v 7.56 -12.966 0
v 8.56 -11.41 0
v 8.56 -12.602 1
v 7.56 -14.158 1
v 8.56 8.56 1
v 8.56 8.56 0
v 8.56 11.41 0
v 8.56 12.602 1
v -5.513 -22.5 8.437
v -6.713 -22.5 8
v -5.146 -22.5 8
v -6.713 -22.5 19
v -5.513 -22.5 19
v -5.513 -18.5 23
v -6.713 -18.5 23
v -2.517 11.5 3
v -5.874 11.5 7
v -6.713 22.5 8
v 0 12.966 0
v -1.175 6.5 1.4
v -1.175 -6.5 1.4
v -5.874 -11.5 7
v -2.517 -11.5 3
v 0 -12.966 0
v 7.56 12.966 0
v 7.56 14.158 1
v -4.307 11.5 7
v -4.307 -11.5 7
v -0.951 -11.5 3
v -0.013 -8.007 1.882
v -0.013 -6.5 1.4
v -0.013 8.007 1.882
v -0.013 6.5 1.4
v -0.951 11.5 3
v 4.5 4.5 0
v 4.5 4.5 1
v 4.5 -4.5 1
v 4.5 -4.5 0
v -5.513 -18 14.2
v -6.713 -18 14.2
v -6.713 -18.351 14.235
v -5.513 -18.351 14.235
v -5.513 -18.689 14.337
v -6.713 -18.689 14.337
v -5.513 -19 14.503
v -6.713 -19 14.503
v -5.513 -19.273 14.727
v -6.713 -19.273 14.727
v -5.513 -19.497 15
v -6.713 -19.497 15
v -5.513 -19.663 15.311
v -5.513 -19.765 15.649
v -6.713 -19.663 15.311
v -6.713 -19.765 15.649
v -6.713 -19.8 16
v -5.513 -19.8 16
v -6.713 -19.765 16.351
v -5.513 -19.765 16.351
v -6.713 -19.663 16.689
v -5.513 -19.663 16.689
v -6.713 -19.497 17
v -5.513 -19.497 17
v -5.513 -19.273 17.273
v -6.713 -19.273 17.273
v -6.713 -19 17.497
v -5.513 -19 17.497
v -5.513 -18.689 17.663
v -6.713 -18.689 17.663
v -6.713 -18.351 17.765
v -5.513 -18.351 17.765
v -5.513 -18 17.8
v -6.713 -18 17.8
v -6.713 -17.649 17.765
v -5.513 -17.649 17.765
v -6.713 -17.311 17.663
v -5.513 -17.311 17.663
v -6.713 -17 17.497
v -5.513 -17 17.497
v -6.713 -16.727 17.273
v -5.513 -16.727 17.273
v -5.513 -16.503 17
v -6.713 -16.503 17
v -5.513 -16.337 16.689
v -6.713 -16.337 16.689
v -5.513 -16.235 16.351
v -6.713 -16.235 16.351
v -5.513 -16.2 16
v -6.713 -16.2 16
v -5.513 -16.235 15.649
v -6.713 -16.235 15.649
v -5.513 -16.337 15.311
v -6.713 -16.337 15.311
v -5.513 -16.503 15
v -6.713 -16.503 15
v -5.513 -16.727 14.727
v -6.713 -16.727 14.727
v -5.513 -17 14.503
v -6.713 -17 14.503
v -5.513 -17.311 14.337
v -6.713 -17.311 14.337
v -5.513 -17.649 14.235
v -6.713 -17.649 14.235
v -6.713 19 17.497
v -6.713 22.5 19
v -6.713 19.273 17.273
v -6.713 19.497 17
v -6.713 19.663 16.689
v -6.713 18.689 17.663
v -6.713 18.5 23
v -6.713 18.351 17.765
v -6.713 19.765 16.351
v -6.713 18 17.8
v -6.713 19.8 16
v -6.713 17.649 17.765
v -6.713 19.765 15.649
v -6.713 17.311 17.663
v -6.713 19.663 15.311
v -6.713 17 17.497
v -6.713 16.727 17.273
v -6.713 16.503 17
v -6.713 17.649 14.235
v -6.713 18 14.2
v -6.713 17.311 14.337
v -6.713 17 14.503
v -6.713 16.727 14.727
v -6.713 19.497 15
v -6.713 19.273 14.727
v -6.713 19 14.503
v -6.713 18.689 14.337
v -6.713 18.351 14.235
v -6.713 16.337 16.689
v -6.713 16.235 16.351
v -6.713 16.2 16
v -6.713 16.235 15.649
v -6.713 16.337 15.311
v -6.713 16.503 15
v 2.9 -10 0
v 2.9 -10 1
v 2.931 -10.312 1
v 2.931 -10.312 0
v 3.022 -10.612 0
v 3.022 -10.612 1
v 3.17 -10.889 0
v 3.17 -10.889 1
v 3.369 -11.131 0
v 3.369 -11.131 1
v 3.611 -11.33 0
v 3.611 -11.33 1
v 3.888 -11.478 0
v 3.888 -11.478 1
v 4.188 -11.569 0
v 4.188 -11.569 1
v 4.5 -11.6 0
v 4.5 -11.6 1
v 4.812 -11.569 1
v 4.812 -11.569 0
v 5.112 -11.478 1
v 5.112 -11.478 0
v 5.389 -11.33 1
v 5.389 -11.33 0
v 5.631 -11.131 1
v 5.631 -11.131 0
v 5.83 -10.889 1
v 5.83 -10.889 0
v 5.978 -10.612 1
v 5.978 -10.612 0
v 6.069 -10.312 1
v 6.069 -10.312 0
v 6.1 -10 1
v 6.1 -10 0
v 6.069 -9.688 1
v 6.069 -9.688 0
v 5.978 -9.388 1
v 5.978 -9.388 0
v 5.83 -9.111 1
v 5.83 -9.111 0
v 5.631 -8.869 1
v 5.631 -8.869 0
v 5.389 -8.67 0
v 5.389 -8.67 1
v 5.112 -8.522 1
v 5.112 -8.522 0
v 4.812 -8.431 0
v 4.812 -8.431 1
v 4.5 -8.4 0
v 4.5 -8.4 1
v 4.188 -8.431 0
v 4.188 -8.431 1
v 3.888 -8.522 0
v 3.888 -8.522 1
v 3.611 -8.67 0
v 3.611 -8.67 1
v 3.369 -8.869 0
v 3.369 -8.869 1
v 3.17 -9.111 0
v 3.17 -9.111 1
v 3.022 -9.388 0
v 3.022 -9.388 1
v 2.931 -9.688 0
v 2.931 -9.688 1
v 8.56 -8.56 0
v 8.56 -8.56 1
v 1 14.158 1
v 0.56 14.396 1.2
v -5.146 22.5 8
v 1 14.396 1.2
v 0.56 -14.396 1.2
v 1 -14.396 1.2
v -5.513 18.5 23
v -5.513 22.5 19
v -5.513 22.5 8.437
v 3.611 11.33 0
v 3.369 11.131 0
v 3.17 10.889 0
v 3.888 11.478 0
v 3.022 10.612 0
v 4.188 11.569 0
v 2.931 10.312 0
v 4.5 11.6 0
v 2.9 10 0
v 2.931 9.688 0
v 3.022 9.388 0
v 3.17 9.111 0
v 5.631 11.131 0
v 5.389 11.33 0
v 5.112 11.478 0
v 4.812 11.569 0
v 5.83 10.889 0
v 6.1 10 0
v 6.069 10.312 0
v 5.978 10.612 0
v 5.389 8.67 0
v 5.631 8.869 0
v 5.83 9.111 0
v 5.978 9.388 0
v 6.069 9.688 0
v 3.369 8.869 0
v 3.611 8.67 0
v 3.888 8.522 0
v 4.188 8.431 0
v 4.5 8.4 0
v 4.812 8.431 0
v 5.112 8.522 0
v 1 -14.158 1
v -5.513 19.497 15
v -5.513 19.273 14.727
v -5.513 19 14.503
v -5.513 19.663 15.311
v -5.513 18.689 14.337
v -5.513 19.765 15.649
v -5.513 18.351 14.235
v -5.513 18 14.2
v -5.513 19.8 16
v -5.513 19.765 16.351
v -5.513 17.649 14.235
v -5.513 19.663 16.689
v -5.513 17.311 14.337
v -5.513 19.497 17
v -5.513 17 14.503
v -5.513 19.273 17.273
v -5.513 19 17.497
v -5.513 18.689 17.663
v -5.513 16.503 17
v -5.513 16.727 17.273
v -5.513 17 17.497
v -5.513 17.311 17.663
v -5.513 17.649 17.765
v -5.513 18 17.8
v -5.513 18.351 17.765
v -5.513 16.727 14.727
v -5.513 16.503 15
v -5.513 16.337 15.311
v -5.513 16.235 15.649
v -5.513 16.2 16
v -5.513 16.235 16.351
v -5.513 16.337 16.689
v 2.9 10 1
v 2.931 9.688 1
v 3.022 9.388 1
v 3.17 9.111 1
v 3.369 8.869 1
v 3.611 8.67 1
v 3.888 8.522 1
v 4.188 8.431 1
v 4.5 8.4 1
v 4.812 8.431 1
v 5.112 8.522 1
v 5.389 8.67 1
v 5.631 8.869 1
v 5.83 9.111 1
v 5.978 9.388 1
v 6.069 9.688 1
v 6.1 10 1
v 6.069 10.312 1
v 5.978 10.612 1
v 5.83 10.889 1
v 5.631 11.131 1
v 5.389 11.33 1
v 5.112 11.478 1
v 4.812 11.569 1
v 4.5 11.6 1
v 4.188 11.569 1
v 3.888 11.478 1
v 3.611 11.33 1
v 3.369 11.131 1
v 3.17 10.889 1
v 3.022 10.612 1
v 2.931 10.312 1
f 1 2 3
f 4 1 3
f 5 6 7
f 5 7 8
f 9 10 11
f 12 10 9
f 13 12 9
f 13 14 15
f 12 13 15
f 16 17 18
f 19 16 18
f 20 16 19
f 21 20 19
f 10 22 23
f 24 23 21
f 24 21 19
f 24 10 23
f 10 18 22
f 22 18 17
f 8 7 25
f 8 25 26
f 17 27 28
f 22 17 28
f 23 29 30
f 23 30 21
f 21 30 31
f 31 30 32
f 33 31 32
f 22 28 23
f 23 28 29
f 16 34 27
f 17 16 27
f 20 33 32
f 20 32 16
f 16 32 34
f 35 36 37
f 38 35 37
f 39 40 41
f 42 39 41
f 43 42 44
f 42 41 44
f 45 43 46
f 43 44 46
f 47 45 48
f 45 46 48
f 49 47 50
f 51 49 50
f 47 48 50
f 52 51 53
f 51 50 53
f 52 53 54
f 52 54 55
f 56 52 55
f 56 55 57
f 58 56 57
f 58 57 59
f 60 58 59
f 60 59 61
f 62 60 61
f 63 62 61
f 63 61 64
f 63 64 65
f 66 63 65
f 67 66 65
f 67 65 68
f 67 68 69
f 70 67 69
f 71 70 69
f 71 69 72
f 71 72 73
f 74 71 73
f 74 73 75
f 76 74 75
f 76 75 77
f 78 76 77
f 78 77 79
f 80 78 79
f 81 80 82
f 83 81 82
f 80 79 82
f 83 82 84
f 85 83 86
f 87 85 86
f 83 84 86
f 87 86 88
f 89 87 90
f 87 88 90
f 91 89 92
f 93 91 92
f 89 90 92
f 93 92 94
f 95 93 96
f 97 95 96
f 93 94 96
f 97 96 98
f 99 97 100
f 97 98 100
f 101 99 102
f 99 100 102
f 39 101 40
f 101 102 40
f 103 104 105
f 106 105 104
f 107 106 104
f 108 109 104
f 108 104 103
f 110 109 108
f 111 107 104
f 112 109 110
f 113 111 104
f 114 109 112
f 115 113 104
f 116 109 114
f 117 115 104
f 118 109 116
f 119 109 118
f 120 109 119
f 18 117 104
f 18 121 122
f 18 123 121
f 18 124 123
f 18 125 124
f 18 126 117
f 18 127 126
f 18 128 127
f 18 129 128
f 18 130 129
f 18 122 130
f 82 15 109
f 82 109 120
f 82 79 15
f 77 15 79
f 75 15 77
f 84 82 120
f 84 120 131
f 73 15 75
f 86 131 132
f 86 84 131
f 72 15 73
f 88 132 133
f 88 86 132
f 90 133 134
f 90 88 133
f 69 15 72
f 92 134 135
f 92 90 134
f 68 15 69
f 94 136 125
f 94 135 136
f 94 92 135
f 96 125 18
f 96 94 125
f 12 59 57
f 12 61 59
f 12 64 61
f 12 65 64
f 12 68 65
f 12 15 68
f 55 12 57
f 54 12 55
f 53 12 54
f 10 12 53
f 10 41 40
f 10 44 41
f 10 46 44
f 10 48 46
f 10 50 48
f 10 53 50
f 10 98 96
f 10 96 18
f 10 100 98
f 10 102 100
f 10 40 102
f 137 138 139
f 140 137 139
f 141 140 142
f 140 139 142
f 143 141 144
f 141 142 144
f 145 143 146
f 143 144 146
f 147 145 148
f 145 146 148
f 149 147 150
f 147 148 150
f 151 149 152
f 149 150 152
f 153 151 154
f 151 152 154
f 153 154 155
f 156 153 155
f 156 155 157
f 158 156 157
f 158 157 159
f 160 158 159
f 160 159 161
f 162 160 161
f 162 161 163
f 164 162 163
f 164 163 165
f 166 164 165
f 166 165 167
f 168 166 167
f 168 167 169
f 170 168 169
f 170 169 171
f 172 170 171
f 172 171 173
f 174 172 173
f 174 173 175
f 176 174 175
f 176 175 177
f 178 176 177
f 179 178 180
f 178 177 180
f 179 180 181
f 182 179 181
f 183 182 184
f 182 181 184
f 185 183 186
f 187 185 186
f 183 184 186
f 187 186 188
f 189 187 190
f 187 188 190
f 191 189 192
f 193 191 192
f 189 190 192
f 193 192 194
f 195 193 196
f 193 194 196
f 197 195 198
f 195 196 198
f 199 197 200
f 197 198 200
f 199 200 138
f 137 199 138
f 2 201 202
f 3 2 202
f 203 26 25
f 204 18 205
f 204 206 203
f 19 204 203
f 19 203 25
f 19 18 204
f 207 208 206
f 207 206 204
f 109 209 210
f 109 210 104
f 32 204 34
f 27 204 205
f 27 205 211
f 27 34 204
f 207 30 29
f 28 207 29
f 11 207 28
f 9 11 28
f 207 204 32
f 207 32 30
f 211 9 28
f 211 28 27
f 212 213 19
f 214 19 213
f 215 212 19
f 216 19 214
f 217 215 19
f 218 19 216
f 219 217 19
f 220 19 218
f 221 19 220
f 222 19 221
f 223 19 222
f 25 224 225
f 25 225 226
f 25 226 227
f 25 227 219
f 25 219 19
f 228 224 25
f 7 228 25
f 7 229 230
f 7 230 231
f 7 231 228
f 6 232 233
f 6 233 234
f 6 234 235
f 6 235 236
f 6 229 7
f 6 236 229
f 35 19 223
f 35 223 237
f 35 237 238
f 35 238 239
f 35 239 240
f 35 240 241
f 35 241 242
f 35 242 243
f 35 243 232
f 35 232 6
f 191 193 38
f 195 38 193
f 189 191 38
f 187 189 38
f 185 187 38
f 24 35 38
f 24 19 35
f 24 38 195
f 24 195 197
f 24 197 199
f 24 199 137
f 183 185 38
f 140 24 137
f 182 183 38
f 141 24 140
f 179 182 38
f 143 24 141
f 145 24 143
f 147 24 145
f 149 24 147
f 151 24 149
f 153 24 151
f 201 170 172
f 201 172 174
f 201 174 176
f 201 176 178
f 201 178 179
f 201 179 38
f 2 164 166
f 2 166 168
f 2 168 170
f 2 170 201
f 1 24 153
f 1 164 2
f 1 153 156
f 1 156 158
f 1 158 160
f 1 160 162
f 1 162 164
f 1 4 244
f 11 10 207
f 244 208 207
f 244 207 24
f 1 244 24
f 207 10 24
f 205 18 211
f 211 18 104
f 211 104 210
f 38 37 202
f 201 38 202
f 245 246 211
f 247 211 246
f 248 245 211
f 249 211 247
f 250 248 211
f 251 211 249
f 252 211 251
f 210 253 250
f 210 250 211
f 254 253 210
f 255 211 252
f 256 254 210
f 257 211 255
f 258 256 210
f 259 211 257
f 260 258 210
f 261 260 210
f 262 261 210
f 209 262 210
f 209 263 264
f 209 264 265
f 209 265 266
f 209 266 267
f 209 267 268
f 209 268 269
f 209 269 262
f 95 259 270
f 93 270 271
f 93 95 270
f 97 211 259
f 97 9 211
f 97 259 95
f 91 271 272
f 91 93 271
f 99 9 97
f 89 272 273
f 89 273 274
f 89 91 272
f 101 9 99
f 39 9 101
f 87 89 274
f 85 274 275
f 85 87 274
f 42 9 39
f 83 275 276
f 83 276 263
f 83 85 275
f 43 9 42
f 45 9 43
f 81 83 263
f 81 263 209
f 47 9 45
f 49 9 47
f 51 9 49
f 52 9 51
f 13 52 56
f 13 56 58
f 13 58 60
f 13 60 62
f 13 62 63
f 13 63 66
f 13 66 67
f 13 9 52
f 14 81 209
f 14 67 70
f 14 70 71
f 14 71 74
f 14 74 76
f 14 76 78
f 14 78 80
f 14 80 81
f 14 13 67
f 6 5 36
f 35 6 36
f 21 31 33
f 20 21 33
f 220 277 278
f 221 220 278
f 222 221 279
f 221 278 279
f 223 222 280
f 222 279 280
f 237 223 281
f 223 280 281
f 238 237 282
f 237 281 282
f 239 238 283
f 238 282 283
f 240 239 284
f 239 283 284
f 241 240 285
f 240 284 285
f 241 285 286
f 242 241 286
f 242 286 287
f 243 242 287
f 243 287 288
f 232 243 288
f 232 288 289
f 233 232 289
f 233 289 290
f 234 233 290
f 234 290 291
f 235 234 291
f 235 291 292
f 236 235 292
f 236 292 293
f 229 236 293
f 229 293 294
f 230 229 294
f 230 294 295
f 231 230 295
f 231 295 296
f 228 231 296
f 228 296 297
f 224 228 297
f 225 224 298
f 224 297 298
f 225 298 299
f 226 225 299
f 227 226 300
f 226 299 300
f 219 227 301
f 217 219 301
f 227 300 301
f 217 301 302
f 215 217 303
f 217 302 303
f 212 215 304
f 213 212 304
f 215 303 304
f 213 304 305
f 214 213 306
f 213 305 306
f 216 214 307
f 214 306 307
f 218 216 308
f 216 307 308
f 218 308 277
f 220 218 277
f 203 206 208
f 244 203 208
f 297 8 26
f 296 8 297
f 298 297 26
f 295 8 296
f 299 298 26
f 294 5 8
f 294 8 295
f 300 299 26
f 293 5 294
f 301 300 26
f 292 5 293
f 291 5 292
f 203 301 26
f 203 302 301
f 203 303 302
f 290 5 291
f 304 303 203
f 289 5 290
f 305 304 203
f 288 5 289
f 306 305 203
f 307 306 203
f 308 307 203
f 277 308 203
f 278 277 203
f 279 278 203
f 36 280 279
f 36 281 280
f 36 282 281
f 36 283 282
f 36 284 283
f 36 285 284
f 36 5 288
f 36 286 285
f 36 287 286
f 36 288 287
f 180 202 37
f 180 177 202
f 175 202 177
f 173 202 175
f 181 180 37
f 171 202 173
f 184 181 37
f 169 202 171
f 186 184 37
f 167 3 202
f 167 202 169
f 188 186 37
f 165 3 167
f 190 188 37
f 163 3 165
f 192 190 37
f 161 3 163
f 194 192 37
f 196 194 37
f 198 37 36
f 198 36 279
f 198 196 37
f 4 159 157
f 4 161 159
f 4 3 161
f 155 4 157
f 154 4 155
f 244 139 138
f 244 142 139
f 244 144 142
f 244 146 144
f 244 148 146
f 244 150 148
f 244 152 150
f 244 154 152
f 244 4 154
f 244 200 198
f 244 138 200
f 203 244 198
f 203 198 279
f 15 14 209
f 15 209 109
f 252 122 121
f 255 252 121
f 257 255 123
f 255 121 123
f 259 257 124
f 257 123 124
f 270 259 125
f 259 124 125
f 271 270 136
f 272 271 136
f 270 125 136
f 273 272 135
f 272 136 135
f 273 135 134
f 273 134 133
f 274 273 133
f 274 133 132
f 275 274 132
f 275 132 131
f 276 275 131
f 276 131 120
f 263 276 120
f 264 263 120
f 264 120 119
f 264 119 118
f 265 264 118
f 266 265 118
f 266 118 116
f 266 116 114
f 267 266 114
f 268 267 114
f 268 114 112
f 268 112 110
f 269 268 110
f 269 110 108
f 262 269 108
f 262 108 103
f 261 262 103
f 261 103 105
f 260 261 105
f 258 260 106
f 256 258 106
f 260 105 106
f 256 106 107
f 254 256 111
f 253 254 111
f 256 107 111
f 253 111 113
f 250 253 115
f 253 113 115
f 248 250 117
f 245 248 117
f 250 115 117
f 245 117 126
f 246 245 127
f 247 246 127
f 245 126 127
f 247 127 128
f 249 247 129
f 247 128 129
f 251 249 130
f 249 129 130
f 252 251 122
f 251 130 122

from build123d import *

# Parameters (mm, degrees)
PAD_DEPTH       = 22.5
POCKET_DEPTH    = 20
SKETCH002_R     = 1.6
POCKET001_DEPTH = 5
SKETCH003_R     = 1.8
POCKET002_DEPTH = 5
CHAMFER001_SIZE = 4
CHAMFER_SIZE    = 1
POCKET003_DEPTH = 5.5
SKETCH005_W     = 8
SKETCH005_H     = 29
POCKET004_DEPTH = 0.2


with BuildPart() as part:
    # Sketch → Pad (new body, symmetric)
    with BuildSketch(Plane.XZ):
        Polygon((0, 0), (8.559569, 0), (8.559569, 1.2), (0.559569, 1.2), (-5.512797, 8.436764), (-5.512797, 23), (-6.712797, 23), (-6.712797, 8), align=None)
    extrude(amount=PAD_DEPTH, both=True)

    # Sketch001 (on Face7 of Pad) → Pocket (cut)
    with BuildSketch(Plane(origin=(-6.712797, 0, 0), x_dir=(0, 0, -1), z_dir=(-1, 0, 0))):
        Polygon((-8, -22.5), (0, -12.965971), (0, -23.5), (-8, -23.5), align=None)
        Polygon((-8, 22.5), (0, 12.965971), (0, 23.5), (-8, 23.5), align=None)
    extrude(amount=-POCKET_DEPTH, mode=Mode.SUBTRACT)

    # Sketch002 (on Face6 of Pocket) → Pocket001 (cut)
    with BuildSketch(Plane(origin=(0, 0, 1.2), x_dir=(-1, 0, 0), z_dir=(0, 0, 1))):
        with Locations((-4.5, 10)):
            Circle(SKETCH002_R)
        with Locations((-4.5, -10)):
            Circle(SKETCH002_R)
        Polygon((-9.5, -9.5), (-4.5, -4.5), (-4.5, 4.5), (-9.5, 9.5), align=None)
    extrude(amount=-POCKET001_DEPTH, mode=Mode.SUBTRACT)

    # Sketch003 (on Face16 of Pocket001) → Pocket002 (cut)
    with BuildSketch(Plane(origin=(-6.712797, 0, 0), x_dir=(0, 0, -1), z_dir=(-1, 0, 0))):
        with Locations((-16, 18)):
            Circle(SKETCH003_R)
        with Locations((-16, -18)):
            Circle(SKETCH003_R)
    extrude(amount=-POCKET002_DEPTH, mode=Mode.SUBTRACT)

    # Chamfer001
    chamfer001_edges = [part.edges().sort_by_distance(p)[0] for p in [
        (-6.112797, -22.5, 23),
        (-6.112797, 22.5, 23),
    ]]
    chamfer(chamfer001_edges, length=CHAMFER001_SIZE)

    # Chamfer
    chamfer_edges = [part.edges().sort_by_distance(p)[0] for p in [
        (8.559569, -13.681023, 0.6),
        (8.559569, 13.681023, 0.6),
    ]]
    chamfer(chamfer_edges, length=CHAMFER_SIZE)

    # Sketch004 (on Face19 of Chamfer) → Pocket003 (cut, symmetric)
    with BuildSketch(Plane(origin=(-5.512797, 0, 0), x_dir=(0, 0, 1), z_dir=(1, 0, 0))):
        Polygon((1.4, 6.5), (1.4, -6.5), (3, -11.5), (7, -11.5), (7, 11.5), (3, 11.5), align=None)
    extrude(amount=POCKET003_DEPTH, both=True, mode=Mode.SUBTRACT)

    # Sketch005 (on Face5 of Pocket003) → Pocket004 (cut)
    with BuildSketch(Plane(origin=(0, 0, 1.2), x_dir=(-1, 0, 0), z_dir=(0, 0, 1))):
        with Locations((-5, 0)):
            Rectangle(SKETCH005_W, SKETCH005_H)
    extrude(amount=-POCKET004_DEPTH, mode=Mode.SUBTRACT)


solid = part.part
